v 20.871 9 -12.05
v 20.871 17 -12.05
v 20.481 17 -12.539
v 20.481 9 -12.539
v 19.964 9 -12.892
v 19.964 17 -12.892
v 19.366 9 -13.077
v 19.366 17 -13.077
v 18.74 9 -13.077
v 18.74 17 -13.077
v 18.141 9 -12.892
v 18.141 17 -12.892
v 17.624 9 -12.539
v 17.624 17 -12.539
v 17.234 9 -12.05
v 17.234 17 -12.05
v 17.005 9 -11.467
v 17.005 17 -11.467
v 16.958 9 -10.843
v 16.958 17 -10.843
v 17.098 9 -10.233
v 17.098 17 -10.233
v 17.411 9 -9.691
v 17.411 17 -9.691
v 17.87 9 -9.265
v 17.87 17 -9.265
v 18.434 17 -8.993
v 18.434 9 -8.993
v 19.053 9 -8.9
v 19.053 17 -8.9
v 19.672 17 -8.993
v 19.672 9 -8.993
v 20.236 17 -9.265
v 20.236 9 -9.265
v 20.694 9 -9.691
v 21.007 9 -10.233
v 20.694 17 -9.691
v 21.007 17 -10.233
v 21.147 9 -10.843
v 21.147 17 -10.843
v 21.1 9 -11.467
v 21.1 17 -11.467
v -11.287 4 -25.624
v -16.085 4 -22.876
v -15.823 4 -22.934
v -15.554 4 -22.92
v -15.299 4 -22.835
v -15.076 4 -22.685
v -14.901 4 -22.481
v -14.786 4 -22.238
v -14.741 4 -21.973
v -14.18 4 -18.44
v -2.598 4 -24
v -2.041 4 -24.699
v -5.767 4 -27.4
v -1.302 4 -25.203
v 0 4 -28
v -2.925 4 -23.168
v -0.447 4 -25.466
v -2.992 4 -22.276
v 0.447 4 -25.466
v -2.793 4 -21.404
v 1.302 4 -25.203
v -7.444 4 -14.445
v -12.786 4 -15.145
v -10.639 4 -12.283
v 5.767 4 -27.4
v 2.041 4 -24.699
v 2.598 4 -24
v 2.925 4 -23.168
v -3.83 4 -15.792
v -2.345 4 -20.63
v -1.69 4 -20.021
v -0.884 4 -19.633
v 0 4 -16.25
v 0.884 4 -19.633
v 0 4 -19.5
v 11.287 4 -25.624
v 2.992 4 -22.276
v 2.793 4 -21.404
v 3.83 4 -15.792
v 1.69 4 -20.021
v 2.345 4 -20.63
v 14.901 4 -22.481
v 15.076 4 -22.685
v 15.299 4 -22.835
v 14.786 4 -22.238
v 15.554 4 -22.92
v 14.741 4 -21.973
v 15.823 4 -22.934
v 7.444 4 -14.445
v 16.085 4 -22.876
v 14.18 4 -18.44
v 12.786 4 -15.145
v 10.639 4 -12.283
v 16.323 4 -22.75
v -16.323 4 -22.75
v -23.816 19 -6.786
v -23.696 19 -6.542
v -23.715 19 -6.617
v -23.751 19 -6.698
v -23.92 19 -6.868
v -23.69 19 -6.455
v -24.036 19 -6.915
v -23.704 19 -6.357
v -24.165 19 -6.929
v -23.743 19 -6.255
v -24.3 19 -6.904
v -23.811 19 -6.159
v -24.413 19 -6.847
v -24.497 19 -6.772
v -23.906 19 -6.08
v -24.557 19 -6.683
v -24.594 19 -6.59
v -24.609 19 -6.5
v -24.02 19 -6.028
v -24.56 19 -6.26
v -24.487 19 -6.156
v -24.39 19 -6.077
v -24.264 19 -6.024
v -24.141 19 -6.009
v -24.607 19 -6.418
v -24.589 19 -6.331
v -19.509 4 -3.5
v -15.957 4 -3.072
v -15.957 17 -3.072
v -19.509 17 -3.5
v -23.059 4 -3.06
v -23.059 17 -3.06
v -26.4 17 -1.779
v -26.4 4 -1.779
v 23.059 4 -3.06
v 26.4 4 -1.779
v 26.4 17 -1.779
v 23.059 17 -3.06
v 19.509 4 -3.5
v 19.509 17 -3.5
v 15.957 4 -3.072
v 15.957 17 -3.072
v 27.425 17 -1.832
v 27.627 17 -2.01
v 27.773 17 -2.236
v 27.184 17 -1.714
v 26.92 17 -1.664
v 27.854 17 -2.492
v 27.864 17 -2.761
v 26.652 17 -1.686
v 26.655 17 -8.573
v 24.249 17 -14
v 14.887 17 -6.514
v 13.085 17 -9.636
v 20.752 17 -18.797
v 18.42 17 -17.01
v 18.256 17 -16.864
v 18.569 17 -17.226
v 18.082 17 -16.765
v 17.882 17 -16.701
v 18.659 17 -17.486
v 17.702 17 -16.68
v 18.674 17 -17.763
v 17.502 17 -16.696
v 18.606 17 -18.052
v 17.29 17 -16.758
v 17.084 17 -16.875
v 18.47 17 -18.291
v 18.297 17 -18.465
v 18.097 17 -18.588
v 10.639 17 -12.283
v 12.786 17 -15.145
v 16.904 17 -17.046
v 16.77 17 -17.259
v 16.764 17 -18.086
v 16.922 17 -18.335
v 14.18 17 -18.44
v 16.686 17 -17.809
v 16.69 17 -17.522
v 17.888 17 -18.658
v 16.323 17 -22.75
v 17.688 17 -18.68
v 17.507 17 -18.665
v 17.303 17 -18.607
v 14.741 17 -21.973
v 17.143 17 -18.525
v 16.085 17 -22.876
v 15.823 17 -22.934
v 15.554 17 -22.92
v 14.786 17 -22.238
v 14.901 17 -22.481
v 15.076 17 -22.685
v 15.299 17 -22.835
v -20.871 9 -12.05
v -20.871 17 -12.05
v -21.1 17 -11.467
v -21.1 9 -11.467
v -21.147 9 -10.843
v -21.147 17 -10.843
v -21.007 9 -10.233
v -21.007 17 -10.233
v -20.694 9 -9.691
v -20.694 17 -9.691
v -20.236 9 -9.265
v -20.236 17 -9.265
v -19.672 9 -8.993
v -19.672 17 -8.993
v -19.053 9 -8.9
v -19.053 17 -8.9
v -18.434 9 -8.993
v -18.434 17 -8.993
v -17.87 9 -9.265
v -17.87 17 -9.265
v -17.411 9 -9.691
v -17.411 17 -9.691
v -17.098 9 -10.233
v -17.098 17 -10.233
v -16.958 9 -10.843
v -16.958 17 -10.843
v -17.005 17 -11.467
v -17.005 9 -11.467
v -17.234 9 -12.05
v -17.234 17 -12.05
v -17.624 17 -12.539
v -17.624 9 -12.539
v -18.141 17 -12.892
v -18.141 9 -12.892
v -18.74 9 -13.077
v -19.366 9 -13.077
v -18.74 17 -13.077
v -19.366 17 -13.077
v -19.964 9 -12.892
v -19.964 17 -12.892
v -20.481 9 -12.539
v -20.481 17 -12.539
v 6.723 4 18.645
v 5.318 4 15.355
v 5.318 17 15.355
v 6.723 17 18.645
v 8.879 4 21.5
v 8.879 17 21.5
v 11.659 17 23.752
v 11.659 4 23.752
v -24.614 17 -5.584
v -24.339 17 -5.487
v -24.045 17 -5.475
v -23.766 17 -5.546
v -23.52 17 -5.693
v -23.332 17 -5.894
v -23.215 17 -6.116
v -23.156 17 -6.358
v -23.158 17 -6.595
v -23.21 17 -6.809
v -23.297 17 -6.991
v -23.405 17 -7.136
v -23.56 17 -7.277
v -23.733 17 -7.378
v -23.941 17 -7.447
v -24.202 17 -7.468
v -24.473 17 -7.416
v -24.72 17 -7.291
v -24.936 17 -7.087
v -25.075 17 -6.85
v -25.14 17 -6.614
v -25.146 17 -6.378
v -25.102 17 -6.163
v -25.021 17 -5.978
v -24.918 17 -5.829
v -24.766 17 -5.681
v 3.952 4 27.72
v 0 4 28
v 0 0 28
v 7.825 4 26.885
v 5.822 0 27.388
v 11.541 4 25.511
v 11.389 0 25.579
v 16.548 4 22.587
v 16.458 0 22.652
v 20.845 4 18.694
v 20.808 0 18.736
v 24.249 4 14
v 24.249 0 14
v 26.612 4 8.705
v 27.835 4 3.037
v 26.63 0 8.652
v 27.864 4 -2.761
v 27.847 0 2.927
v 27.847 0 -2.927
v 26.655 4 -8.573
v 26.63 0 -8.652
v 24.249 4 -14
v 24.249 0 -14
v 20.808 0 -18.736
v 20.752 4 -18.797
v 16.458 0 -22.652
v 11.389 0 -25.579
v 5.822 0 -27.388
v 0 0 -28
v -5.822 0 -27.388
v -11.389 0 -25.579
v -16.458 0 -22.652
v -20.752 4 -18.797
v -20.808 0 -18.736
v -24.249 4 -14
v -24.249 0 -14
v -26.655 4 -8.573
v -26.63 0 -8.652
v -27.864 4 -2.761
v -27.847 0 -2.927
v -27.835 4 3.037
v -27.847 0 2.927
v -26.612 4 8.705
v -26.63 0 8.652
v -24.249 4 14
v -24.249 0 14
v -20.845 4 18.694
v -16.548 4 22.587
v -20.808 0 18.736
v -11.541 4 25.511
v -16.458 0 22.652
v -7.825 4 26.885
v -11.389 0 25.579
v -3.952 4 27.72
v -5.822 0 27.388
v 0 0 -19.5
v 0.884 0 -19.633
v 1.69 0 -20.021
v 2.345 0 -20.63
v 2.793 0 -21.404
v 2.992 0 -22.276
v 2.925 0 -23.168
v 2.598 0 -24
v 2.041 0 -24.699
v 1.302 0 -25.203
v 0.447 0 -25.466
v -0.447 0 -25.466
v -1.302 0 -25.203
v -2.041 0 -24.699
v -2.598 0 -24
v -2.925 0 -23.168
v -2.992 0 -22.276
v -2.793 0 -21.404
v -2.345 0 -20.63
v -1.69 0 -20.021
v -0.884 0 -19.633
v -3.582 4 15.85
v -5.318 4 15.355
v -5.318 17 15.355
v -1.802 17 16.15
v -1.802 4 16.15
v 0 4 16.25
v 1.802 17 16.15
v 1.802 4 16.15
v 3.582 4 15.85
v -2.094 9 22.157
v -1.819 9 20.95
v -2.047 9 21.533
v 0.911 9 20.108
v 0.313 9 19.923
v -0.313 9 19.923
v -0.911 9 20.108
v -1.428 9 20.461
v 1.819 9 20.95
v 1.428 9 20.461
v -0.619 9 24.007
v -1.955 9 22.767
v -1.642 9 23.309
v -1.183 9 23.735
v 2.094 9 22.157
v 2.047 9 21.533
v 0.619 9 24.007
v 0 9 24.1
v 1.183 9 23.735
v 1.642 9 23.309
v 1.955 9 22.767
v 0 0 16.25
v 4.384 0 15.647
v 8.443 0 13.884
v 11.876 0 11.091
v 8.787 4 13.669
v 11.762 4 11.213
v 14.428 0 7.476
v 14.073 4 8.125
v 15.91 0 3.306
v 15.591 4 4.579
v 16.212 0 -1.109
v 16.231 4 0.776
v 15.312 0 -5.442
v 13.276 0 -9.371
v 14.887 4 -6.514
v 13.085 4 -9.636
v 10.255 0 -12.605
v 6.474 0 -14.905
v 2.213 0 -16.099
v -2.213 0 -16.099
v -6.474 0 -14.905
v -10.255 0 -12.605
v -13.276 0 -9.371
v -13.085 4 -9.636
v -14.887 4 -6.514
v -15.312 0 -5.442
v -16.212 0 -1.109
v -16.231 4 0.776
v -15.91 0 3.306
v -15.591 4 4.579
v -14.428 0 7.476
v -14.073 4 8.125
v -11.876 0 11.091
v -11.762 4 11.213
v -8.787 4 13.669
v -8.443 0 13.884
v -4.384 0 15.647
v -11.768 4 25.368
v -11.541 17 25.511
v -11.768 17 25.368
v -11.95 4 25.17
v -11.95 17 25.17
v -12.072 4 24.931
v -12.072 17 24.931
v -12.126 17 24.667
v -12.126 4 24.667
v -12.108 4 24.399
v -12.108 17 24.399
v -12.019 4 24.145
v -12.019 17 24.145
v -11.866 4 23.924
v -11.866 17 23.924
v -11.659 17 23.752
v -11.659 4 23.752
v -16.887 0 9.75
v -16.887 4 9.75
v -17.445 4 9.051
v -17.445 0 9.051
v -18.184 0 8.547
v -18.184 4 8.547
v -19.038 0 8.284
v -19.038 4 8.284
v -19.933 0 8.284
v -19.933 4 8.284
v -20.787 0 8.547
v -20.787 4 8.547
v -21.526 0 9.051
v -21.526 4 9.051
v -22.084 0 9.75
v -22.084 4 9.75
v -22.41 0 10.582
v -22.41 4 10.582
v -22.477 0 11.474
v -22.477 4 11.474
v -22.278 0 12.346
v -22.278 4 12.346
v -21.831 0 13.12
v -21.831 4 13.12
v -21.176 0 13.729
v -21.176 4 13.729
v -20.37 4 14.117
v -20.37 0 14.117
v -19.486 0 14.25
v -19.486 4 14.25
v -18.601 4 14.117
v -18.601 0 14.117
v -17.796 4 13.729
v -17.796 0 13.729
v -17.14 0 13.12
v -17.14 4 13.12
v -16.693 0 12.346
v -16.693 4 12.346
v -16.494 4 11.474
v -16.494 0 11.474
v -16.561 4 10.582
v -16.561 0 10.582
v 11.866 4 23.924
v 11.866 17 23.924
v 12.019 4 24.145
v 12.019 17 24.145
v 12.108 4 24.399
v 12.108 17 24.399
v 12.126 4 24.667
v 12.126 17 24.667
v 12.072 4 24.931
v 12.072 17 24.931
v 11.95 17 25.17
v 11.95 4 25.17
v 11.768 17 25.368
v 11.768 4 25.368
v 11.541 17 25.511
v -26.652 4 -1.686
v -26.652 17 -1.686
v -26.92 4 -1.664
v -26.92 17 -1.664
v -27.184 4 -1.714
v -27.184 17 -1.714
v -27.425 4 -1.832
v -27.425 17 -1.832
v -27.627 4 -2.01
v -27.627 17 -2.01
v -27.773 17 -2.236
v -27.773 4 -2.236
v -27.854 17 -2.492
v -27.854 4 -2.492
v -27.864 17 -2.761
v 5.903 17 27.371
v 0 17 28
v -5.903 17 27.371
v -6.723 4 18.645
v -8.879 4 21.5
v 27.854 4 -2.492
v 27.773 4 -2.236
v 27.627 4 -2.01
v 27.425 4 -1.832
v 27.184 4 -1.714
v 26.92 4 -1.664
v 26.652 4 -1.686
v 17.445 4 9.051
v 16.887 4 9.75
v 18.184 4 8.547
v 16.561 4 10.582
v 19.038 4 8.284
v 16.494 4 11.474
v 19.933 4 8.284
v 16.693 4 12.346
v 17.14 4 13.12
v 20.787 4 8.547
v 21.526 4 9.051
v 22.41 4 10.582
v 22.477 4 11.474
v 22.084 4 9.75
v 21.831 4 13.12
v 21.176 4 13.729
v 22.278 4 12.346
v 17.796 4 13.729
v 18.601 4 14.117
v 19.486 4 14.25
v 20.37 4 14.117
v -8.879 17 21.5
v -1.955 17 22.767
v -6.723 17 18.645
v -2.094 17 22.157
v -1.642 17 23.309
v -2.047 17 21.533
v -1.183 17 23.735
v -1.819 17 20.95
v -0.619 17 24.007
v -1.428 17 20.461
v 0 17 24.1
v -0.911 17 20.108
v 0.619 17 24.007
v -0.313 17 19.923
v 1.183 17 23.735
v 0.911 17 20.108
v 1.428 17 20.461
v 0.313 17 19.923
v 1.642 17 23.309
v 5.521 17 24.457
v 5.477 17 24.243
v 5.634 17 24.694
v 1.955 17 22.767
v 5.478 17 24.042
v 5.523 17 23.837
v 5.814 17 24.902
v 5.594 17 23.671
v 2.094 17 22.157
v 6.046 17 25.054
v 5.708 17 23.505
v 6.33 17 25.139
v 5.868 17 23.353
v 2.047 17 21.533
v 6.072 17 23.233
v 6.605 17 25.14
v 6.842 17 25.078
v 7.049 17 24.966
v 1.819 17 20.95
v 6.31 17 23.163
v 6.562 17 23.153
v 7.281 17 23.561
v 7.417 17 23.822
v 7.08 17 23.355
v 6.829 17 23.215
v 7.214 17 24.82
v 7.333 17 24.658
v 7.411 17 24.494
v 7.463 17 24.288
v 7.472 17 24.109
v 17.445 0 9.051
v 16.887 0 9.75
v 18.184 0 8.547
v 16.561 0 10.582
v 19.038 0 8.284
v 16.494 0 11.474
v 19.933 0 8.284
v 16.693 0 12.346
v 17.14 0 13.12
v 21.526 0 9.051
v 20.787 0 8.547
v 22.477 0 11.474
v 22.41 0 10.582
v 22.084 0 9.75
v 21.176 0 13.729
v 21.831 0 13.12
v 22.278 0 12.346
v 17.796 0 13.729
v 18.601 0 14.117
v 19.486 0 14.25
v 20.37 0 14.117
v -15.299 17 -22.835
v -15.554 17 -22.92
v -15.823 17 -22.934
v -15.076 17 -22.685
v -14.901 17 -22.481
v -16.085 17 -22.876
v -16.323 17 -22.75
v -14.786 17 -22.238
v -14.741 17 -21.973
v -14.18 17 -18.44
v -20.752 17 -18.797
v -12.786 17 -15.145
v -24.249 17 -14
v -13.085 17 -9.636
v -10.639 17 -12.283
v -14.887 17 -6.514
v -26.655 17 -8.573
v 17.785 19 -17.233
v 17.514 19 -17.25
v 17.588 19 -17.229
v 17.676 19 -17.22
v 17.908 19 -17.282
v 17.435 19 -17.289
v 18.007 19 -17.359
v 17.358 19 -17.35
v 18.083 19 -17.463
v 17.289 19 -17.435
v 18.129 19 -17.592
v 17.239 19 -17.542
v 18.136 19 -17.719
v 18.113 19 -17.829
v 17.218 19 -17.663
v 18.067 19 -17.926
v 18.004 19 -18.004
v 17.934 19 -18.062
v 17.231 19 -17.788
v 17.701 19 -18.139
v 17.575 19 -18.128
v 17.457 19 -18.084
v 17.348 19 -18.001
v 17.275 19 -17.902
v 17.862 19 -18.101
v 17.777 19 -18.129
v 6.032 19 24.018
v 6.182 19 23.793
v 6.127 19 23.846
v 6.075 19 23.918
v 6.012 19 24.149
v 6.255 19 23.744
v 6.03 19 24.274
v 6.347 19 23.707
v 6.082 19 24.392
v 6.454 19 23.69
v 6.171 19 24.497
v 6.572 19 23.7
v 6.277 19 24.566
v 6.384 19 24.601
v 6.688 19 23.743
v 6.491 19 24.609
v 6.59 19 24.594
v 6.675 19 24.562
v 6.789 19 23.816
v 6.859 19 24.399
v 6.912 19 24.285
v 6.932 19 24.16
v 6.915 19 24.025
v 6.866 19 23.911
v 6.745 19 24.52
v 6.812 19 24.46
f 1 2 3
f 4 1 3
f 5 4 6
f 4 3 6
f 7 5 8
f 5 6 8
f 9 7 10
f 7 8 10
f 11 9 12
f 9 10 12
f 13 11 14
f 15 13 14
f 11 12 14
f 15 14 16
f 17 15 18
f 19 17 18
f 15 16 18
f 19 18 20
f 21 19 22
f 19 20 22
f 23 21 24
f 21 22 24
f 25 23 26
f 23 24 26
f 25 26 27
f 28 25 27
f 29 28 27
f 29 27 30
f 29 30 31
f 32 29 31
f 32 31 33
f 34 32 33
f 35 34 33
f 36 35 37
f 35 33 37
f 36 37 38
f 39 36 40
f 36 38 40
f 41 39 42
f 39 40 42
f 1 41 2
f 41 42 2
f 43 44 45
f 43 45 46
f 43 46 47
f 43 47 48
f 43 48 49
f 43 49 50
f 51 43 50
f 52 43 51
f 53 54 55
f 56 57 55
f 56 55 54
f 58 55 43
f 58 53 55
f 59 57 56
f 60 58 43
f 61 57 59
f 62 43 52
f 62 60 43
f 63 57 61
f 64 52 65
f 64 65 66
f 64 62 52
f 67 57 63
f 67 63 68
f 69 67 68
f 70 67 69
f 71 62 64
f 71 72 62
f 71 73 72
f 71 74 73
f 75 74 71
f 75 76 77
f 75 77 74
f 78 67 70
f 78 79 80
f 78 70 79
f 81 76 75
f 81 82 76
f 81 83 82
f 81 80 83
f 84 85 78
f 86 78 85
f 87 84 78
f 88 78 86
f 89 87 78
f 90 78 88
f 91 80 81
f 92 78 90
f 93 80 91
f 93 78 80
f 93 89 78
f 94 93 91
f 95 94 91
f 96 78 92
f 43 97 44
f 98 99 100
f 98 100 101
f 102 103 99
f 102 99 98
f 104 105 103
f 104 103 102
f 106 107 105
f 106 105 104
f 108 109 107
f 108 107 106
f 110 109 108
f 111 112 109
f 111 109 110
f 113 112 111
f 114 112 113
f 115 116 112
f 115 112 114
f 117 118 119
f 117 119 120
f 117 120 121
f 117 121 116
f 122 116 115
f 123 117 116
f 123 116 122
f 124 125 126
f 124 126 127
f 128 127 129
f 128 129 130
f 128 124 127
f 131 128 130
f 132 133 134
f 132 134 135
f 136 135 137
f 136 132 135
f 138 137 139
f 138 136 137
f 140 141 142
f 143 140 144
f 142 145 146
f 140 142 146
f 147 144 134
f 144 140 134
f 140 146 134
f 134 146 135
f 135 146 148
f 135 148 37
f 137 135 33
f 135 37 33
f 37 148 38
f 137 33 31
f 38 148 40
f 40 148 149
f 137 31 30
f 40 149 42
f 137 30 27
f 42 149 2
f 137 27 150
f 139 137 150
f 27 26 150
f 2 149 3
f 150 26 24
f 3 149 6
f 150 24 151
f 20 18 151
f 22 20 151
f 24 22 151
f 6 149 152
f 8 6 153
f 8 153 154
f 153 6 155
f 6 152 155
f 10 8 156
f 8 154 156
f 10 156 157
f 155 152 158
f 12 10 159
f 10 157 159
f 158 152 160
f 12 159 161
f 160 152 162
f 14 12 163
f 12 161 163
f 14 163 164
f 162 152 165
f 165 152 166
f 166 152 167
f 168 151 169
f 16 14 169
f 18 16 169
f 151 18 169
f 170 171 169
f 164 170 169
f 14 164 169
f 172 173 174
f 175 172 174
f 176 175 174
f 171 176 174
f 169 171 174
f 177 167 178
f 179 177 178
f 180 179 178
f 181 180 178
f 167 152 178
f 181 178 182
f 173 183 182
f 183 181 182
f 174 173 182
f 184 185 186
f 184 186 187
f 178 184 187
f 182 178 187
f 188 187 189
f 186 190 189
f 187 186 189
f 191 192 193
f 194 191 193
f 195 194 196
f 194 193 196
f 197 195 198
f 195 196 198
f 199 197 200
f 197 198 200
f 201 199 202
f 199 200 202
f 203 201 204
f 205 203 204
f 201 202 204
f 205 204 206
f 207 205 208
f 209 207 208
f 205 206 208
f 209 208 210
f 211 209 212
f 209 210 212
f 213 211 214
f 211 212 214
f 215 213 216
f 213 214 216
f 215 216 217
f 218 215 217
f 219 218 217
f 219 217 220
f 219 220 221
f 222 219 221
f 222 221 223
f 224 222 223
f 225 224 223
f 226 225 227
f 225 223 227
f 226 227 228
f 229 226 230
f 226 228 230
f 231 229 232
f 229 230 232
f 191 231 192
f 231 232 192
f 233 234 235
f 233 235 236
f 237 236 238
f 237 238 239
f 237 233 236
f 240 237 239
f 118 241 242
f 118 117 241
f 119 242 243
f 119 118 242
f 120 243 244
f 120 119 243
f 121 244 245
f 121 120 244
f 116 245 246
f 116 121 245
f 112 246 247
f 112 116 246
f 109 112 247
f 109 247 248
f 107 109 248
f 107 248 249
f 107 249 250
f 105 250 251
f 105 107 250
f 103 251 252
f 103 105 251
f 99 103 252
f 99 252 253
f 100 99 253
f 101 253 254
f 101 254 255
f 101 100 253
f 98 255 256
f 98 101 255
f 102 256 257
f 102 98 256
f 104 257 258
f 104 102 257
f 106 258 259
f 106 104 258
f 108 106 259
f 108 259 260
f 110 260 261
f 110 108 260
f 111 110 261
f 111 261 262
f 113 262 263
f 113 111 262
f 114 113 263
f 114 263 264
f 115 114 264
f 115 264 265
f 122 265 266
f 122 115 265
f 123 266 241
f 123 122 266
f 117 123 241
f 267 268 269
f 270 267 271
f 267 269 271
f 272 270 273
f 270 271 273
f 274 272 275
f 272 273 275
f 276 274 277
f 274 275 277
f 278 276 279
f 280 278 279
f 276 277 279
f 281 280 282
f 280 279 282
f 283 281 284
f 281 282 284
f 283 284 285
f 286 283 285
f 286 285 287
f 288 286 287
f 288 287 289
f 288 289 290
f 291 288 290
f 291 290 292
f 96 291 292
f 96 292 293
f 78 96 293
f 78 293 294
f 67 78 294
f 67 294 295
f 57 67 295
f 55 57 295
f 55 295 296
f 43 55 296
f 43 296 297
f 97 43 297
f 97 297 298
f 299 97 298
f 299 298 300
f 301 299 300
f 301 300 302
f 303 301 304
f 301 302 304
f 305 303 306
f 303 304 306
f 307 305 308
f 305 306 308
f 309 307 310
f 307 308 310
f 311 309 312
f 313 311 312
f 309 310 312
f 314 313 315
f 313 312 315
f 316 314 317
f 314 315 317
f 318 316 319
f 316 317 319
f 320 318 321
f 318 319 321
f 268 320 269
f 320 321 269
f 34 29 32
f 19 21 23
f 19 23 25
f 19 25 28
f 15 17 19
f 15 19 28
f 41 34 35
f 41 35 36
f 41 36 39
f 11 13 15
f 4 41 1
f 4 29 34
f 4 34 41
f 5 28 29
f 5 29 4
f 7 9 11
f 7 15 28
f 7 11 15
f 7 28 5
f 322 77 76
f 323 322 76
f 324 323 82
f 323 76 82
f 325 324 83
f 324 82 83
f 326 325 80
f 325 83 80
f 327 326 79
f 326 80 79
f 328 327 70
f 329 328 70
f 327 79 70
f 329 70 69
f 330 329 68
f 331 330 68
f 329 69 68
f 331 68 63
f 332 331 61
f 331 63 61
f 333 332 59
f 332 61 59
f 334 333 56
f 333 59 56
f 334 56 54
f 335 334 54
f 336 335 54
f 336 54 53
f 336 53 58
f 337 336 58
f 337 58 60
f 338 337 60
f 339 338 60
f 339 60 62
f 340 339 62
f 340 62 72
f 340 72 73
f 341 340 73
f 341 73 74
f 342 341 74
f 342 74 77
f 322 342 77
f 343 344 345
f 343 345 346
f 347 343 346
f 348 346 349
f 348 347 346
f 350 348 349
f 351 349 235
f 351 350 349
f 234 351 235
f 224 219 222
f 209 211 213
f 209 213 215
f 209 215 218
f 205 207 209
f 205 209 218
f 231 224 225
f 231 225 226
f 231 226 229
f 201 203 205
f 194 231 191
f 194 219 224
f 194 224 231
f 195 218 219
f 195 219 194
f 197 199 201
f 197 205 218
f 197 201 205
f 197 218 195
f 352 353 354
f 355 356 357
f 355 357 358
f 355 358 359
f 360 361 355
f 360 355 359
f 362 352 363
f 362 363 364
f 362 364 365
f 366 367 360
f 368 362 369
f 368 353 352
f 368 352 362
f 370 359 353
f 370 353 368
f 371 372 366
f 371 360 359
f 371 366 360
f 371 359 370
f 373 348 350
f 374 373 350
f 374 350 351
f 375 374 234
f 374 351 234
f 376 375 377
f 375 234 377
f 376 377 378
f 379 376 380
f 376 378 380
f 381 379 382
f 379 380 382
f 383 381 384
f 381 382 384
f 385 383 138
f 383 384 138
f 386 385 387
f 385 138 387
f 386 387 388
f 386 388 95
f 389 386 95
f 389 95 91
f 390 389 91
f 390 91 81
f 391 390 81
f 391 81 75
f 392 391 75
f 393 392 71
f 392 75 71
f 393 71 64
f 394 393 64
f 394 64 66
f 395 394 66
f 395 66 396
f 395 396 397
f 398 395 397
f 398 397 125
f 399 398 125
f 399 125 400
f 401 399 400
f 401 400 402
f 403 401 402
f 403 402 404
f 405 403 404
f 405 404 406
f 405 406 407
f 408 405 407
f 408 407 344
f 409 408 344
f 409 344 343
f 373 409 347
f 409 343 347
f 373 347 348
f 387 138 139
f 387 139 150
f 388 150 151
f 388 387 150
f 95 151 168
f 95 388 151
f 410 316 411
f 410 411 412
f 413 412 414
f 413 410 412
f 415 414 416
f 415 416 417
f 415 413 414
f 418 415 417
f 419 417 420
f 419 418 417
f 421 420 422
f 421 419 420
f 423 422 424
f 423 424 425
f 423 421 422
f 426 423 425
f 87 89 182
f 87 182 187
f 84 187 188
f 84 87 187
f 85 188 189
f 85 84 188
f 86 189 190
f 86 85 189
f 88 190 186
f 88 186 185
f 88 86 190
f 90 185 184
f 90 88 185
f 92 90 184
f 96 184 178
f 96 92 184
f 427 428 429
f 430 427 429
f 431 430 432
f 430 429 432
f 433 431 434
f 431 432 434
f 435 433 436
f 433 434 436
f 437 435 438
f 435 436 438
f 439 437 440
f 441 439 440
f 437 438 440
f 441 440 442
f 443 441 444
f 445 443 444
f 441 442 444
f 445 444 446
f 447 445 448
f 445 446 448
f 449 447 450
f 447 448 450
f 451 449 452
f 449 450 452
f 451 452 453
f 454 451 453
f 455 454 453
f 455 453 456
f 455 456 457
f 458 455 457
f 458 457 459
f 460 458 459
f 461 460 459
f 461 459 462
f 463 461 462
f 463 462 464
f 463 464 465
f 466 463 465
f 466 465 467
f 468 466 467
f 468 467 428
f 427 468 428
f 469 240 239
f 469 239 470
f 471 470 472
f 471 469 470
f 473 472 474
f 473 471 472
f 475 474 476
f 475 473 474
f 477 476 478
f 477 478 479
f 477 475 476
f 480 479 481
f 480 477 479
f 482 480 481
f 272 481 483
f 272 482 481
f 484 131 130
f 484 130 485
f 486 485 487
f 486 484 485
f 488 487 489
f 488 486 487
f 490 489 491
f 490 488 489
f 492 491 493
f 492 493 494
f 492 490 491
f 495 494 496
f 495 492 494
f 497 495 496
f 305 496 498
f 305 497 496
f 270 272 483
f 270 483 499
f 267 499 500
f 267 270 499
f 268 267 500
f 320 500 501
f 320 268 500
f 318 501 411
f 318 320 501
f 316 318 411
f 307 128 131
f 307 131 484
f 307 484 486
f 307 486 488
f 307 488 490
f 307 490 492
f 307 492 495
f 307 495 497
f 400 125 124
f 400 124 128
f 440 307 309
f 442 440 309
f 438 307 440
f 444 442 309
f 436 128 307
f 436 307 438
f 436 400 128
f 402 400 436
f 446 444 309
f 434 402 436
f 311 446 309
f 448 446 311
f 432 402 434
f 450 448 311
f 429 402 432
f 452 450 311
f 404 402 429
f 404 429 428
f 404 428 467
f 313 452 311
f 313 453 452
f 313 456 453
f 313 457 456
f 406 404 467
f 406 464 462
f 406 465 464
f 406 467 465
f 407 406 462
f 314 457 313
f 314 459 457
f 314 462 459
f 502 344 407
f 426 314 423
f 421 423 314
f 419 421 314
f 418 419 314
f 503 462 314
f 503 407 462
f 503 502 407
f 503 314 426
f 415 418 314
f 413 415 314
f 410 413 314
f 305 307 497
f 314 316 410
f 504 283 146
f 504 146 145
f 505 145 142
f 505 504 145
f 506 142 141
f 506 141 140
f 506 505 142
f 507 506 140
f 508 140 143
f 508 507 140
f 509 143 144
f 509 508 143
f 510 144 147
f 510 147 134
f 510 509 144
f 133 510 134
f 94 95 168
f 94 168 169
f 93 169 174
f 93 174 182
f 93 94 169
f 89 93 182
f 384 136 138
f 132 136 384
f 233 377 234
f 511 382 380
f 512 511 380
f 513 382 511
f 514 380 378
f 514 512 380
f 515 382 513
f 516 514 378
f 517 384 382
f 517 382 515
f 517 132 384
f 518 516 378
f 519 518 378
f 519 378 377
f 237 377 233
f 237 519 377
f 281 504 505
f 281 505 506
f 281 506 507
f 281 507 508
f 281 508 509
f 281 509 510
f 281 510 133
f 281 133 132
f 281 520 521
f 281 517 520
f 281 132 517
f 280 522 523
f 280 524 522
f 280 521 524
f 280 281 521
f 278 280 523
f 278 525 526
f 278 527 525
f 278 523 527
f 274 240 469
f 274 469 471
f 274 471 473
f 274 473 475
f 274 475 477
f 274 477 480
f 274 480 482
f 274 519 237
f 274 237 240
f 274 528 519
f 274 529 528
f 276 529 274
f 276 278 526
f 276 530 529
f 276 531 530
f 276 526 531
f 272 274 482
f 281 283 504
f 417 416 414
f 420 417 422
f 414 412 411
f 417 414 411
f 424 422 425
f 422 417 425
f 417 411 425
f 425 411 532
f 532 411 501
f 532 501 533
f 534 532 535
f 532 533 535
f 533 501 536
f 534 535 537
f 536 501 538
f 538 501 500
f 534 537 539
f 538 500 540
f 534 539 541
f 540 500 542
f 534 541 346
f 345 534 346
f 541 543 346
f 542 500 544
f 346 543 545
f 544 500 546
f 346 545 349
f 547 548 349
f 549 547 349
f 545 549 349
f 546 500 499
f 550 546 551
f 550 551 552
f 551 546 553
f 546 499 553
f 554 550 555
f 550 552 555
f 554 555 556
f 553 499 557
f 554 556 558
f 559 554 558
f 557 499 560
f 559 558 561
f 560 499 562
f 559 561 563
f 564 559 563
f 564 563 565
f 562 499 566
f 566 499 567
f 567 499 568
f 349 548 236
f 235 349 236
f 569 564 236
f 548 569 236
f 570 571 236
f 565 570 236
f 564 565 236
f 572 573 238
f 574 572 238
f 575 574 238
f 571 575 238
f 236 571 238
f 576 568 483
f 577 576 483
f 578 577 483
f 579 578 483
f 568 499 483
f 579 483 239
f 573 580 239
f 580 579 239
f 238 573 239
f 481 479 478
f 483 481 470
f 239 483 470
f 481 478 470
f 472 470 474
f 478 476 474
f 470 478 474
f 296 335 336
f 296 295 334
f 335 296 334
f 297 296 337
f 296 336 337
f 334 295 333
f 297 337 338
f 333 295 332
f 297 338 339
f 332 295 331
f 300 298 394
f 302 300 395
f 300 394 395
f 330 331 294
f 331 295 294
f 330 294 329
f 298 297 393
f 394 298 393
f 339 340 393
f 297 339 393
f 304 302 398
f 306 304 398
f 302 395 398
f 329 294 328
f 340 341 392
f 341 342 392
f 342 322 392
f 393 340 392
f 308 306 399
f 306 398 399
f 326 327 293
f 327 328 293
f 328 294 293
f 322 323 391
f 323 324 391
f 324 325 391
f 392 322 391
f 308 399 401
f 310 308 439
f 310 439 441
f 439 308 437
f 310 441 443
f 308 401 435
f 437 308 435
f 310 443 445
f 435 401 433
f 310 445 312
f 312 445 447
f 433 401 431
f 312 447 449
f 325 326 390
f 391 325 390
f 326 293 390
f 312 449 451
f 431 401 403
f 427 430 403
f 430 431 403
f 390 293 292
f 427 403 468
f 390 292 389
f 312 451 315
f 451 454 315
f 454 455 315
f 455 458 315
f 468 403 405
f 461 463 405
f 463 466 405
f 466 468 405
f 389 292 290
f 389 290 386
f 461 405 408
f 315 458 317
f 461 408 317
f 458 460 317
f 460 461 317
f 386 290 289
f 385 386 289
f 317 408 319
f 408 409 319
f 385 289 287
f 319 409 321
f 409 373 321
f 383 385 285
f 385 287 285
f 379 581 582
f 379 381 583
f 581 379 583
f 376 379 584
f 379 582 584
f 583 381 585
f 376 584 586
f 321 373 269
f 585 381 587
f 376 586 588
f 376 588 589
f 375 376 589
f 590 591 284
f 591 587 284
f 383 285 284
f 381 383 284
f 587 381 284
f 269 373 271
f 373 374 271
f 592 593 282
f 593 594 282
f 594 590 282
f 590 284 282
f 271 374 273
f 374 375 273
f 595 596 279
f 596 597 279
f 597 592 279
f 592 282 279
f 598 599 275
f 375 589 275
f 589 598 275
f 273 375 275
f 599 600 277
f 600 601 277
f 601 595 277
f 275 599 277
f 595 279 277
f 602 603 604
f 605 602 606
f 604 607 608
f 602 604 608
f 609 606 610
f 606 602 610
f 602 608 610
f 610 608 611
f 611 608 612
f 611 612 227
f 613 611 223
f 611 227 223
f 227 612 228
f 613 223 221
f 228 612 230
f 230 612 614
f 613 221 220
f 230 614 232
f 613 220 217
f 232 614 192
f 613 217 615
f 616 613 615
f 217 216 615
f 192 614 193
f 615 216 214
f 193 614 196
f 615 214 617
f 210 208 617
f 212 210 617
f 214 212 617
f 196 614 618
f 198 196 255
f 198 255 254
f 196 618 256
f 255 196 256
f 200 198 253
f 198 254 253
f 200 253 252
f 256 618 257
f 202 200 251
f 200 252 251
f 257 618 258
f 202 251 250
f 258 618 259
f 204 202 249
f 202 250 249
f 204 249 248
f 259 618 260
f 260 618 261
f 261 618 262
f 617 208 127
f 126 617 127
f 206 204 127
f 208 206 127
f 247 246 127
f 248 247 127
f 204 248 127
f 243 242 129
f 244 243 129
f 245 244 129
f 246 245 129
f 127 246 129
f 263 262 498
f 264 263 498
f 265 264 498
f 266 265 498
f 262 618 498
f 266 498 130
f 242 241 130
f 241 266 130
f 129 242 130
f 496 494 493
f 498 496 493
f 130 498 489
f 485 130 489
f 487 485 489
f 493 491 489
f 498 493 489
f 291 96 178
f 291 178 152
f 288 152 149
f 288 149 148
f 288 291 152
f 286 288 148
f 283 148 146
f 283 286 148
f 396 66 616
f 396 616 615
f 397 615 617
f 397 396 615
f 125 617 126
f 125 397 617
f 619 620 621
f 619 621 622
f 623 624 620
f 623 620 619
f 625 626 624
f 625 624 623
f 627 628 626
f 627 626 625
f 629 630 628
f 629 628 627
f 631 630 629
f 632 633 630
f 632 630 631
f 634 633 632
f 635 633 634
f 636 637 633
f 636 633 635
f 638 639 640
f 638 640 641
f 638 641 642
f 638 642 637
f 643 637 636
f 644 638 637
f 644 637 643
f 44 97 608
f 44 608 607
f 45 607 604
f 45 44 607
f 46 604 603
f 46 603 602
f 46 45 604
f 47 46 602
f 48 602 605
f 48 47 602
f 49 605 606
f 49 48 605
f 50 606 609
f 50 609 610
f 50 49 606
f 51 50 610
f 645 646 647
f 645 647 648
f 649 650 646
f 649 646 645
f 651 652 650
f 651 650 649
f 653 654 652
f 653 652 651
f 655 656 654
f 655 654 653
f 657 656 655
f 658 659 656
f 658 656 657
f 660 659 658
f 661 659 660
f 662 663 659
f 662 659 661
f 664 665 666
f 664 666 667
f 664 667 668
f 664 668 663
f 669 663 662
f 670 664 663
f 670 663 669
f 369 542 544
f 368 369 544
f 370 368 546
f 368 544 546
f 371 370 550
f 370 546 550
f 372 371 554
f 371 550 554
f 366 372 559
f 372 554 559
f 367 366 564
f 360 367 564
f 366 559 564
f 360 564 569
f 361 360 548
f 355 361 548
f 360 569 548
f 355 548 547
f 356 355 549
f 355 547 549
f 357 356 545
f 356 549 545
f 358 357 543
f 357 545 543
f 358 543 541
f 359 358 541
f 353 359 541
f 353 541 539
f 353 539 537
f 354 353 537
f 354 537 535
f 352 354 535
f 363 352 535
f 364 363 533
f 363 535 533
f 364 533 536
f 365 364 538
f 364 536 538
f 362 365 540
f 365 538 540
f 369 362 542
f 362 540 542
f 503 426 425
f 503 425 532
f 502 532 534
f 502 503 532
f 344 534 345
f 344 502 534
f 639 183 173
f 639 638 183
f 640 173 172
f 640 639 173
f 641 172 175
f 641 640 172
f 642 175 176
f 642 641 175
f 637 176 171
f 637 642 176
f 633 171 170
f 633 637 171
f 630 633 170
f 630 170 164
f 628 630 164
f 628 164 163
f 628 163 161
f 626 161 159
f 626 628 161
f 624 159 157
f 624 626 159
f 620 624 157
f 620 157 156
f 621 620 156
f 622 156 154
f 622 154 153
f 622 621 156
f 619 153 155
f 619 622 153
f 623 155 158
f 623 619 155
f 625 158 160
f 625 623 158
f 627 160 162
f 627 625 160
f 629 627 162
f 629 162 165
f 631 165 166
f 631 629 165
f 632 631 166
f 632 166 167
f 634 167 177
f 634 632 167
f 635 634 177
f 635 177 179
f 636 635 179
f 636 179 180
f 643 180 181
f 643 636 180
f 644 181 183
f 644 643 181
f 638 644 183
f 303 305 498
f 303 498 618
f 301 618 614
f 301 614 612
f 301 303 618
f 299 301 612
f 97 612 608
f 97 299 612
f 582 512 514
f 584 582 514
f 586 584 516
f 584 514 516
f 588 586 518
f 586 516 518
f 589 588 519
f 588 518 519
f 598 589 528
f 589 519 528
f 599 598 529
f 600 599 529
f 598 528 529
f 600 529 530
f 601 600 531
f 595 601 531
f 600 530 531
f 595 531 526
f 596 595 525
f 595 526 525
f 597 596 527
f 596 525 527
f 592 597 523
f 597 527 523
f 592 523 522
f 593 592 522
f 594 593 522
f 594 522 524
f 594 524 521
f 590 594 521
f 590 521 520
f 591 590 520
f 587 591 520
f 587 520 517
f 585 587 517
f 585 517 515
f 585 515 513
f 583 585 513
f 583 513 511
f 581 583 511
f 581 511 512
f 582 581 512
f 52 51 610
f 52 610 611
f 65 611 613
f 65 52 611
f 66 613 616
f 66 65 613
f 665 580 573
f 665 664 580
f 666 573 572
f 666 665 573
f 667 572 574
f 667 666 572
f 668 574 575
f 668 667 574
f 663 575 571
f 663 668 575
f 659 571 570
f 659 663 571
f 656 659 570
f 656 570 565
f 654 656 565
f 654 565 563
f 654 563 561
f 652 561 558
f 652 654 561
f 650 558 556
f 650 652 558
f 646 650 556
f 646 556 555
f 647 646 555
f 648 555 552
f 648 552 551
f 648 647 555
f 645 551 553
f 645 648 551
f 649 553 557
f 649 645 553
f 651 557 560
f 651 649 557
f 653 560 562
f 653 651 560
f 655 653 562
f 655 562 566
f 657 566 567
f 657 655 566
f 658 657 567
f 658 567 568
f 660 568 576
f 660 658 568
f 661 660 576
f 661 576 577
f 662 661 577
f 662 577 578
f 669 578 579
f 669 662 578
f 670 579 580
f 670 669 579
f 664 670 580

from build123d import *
from build123d.topology import SkipClean

# Parameters (mm, degrees)
ESBO_O1_R                = 28
RESSALTO_EXTRUS_O1_DEPTH = 4
ESBO_O2_R                = 3
CORTE_EXTRUS_O1_DEPTH    = 40.799497484
PADR_OCIRCULAR1_COUNT    = 3
ESBO_O3_R                = 16.25
CORTE_EXTRUS_O2_DEPTH    = 40.799497484
RESSALTO_EXTRUS_O2_DEPTH = 13
PADR_OCIRCULAR2_COUNT    = 3
ESBO_O5_R                = 2.1
CORTE_EXTRUS_O3_DEPTH    = 8
PADR_OCIRCULAR3_COUNT    = 3
PADR_OCIRCULAR4_COUNT    = 3


with BuildPart() as part:
    # Esboço1 → Ressalto-extrusão1 (new body)
    with BuildSketch(Plane(origin=(0, 0, 0), x_dir=(1, 0, 0), z_dir=(0, 1, 0))):
        with Locations(Location((0, 0, 0), (0, 0, 270))):
            Circle(ESBO_O1_R)
    extrude(amount=RESSALTO_EXTRUS_O1_DEPTH)

    # Esboço2 → Corte-extrusão1 (cut, through all)
    with BuildSketch(Plane(origin=(0, 4, 0), x_dir=(1, 0, 0), z_dir=(0, 1, 0))):
        with Locations(Location((0, 22.5, 0), (0, 0, 270))):
            Circle(ESBO_O2_R)
    corte_extrus_o1 = extrude(amount=-CORTE_EXTRUS_O1_DEPTH, mode=Mode.SUBTRACT)

    # PadrãoCircular1: Corte-extrusão1 ×3 about axis
    padr_ocircular1_axis = Axis((0, 0, 0), (0, 1, 0))
    for i in range(1, PADR_OCIRCULAR1_COUNT):
        add(corte_extrus_o1.rotate(padr_ocircular1_axis, i * 360 / PADR_OCIRCULAR1_COUNT), mode=Mode.SUBTRACT)

    # Esboço3 → Corte-extrusão2 (cut, through all)
    with BuildSketch(Plane(origin=(0, 4, 0), x_dir=(1, 0, 0), z_dir=(0, 1, 0))):
        with Locations(Location((0, 0, 0), (0, 0, 270))):
            Circle(ESBO_O3_R)
    extrude(amount=-CORTE_EXTRUS_O2_DEPTH, mode=Mode.SUBTRACT)

    # Esboço4 → Ressalto-extrusão2 (add)
    with SkipClean():  # the faces are left unmerged after this step: merging them gives an invalid solid
        with BuildSketch(Plane(origin=(0, 4, 0), x_dir=(1, 0, 0), z_dir=(0, 1, 0))):
            with BuildLine():
                ThreePointArc((10.638713373, 12.283333333), (13.583103826, 16.7500617), (14.740590111, 21.973214286))
                ThreePointArc((14.740590111, 21.973214286), (15.299274914, 22.835165623), (16.322913343, 22.75))
                ThreePointArc((16.322913343, 22.75), (24.248711306, 14), (27.863534608, 2.761057619))
                ThreePointArc((27.863534608, 2.761057619), (27.425470986, 1.831977923), (26.39965683, 1.77911836))
                ThreePointArc((26.39965683, 1.77911836), (21.29753086, 3.388282126), (15.957035396, 3.071729378))
                ThreePointArc((15.957035396, 3.071729378), (14.072912811, 8.125), (10.638713373, 12.283333333))
            make_face()
        ressalto_extrus_o2 = extrude(amount=RESSALTO_EXTRUS_O2_DEPTH)

    # PadrãoCircular2: Ressalto-extrusão2 ×3 about axis
    with SkipClean():  # the faces are left unmerged after this step: merging them gives an invalid solid
        padr_ocircular2_axis = Axis((0, 0, 0), (0, 1, 0))
        for i in range(1, PADR_OCIRCULAR2_COUNT):
            add(ressalto_extrus_o2.rotate(padr_ocircular2_axis, i * 360 / PADR_OCIRCULAR2_COUNT))

    # Esboço5 → Corte-extrusão3 (cut)
    with SkipClean():  # the faces are left unmerged after this step: merging them gives an invalid solid
        with BuildSketch(Plane(origin=(0, 17, 0), x_dir=(1, 0, 0), z_dir=(0, 1, 0))):
            with Locations(Location((0, -22, 0), (0, 0, 270))):
                Circle(ESBO_O5_R)
        corte_extrus_o3 = extrude(amount=-CORTE_EXTRUS_O3_DEPTH, mode=Mode.SUBTRACT)

    # PadrãoCircular3: Corte-extrusão3 ×3 about axis
    with SkipClean():  # the faces are left unmerged after this step: merging them gives an invalid solid
        padr_ocircular3_axis = Axis((0, 0, 0), (0, 1, 0))
        for i in range(1, PADR_OCIRCULAR3_COUNT):
            add(corte_extrus_o3.rotate(padr_ocircular3_axis, i * 360 / PADR_OCIRCULAR3_COUNT), mode=Mode.SUBTRACT)

    # Loft1: read off the stored shape, not the designer's step
    # Loft1: loft between two sections, ruled curve by curve
    with SkipClean():  # the faces are left unmerged after this step: merging them gives an invalid solid
        loft1_from = [
            Edge.make_bspline([(7.471626812, 17, 24.108508402), (7.389968108, 17, 22.110176134), (5.391635839, 17, 22.191834838), (5.473294543, 17, 24.190167106), (5.554953247, 17, 26.188499375), (7.553285516, 17, 26.106840671), (7.471626812, 17, 24.108508402)], [0, 0, 0, 0, 0.5, 0.5, 0.5, 1, 1, 1, 1], 3, [1, 0.333333333, 0.333333333, 1, 0.333333333, 0.333333333, 1]),
        ]
        loft1_to = [
            Edge.make_bspline([(6.858825303, 19, 24.398982253), (7.358114301, 19, 23.626253002), (6.58538505, 19, 23.126964004), (6.086096051, 19, 23.899693255), (5.586807053, 19, 24.672422507), (6.359536305, 19, 25.171711505), (6.858825303, 19, 24.398982253)], [0, 0, 0, 0, 0.5, 0.5, 0.5, 1, 1, 1, 1], 3, [1, 0.333333333, 0.333333333, 1, 0.333333333, 0.333333333, 1]),
        ]
        loft1 = Solid(Shell([*[Face.make_surface_from_curves(loft1_from[k], loft1_to[k]) for k in range(1)], Face(Wire(loft1_from)), Face(Wire(loft1_to))]))
        add(loft1)

    # PadrãoCircular4: Loft1 ×3 about axis
    with SkipClean():  # the faces are left unmerged after this step: merging them gives an invalid solid
        padr_ocircular4_axis = Axis((0, 0, 0), (0, -1, 0))
        for i in range(1, PADR_OCIRCULAR4_COUNT):
            add(loft1.rotate(padr_ocircular4_axis, i * 360 / PADR_OCIRCULAR4_COUNT))


solid = part.part
